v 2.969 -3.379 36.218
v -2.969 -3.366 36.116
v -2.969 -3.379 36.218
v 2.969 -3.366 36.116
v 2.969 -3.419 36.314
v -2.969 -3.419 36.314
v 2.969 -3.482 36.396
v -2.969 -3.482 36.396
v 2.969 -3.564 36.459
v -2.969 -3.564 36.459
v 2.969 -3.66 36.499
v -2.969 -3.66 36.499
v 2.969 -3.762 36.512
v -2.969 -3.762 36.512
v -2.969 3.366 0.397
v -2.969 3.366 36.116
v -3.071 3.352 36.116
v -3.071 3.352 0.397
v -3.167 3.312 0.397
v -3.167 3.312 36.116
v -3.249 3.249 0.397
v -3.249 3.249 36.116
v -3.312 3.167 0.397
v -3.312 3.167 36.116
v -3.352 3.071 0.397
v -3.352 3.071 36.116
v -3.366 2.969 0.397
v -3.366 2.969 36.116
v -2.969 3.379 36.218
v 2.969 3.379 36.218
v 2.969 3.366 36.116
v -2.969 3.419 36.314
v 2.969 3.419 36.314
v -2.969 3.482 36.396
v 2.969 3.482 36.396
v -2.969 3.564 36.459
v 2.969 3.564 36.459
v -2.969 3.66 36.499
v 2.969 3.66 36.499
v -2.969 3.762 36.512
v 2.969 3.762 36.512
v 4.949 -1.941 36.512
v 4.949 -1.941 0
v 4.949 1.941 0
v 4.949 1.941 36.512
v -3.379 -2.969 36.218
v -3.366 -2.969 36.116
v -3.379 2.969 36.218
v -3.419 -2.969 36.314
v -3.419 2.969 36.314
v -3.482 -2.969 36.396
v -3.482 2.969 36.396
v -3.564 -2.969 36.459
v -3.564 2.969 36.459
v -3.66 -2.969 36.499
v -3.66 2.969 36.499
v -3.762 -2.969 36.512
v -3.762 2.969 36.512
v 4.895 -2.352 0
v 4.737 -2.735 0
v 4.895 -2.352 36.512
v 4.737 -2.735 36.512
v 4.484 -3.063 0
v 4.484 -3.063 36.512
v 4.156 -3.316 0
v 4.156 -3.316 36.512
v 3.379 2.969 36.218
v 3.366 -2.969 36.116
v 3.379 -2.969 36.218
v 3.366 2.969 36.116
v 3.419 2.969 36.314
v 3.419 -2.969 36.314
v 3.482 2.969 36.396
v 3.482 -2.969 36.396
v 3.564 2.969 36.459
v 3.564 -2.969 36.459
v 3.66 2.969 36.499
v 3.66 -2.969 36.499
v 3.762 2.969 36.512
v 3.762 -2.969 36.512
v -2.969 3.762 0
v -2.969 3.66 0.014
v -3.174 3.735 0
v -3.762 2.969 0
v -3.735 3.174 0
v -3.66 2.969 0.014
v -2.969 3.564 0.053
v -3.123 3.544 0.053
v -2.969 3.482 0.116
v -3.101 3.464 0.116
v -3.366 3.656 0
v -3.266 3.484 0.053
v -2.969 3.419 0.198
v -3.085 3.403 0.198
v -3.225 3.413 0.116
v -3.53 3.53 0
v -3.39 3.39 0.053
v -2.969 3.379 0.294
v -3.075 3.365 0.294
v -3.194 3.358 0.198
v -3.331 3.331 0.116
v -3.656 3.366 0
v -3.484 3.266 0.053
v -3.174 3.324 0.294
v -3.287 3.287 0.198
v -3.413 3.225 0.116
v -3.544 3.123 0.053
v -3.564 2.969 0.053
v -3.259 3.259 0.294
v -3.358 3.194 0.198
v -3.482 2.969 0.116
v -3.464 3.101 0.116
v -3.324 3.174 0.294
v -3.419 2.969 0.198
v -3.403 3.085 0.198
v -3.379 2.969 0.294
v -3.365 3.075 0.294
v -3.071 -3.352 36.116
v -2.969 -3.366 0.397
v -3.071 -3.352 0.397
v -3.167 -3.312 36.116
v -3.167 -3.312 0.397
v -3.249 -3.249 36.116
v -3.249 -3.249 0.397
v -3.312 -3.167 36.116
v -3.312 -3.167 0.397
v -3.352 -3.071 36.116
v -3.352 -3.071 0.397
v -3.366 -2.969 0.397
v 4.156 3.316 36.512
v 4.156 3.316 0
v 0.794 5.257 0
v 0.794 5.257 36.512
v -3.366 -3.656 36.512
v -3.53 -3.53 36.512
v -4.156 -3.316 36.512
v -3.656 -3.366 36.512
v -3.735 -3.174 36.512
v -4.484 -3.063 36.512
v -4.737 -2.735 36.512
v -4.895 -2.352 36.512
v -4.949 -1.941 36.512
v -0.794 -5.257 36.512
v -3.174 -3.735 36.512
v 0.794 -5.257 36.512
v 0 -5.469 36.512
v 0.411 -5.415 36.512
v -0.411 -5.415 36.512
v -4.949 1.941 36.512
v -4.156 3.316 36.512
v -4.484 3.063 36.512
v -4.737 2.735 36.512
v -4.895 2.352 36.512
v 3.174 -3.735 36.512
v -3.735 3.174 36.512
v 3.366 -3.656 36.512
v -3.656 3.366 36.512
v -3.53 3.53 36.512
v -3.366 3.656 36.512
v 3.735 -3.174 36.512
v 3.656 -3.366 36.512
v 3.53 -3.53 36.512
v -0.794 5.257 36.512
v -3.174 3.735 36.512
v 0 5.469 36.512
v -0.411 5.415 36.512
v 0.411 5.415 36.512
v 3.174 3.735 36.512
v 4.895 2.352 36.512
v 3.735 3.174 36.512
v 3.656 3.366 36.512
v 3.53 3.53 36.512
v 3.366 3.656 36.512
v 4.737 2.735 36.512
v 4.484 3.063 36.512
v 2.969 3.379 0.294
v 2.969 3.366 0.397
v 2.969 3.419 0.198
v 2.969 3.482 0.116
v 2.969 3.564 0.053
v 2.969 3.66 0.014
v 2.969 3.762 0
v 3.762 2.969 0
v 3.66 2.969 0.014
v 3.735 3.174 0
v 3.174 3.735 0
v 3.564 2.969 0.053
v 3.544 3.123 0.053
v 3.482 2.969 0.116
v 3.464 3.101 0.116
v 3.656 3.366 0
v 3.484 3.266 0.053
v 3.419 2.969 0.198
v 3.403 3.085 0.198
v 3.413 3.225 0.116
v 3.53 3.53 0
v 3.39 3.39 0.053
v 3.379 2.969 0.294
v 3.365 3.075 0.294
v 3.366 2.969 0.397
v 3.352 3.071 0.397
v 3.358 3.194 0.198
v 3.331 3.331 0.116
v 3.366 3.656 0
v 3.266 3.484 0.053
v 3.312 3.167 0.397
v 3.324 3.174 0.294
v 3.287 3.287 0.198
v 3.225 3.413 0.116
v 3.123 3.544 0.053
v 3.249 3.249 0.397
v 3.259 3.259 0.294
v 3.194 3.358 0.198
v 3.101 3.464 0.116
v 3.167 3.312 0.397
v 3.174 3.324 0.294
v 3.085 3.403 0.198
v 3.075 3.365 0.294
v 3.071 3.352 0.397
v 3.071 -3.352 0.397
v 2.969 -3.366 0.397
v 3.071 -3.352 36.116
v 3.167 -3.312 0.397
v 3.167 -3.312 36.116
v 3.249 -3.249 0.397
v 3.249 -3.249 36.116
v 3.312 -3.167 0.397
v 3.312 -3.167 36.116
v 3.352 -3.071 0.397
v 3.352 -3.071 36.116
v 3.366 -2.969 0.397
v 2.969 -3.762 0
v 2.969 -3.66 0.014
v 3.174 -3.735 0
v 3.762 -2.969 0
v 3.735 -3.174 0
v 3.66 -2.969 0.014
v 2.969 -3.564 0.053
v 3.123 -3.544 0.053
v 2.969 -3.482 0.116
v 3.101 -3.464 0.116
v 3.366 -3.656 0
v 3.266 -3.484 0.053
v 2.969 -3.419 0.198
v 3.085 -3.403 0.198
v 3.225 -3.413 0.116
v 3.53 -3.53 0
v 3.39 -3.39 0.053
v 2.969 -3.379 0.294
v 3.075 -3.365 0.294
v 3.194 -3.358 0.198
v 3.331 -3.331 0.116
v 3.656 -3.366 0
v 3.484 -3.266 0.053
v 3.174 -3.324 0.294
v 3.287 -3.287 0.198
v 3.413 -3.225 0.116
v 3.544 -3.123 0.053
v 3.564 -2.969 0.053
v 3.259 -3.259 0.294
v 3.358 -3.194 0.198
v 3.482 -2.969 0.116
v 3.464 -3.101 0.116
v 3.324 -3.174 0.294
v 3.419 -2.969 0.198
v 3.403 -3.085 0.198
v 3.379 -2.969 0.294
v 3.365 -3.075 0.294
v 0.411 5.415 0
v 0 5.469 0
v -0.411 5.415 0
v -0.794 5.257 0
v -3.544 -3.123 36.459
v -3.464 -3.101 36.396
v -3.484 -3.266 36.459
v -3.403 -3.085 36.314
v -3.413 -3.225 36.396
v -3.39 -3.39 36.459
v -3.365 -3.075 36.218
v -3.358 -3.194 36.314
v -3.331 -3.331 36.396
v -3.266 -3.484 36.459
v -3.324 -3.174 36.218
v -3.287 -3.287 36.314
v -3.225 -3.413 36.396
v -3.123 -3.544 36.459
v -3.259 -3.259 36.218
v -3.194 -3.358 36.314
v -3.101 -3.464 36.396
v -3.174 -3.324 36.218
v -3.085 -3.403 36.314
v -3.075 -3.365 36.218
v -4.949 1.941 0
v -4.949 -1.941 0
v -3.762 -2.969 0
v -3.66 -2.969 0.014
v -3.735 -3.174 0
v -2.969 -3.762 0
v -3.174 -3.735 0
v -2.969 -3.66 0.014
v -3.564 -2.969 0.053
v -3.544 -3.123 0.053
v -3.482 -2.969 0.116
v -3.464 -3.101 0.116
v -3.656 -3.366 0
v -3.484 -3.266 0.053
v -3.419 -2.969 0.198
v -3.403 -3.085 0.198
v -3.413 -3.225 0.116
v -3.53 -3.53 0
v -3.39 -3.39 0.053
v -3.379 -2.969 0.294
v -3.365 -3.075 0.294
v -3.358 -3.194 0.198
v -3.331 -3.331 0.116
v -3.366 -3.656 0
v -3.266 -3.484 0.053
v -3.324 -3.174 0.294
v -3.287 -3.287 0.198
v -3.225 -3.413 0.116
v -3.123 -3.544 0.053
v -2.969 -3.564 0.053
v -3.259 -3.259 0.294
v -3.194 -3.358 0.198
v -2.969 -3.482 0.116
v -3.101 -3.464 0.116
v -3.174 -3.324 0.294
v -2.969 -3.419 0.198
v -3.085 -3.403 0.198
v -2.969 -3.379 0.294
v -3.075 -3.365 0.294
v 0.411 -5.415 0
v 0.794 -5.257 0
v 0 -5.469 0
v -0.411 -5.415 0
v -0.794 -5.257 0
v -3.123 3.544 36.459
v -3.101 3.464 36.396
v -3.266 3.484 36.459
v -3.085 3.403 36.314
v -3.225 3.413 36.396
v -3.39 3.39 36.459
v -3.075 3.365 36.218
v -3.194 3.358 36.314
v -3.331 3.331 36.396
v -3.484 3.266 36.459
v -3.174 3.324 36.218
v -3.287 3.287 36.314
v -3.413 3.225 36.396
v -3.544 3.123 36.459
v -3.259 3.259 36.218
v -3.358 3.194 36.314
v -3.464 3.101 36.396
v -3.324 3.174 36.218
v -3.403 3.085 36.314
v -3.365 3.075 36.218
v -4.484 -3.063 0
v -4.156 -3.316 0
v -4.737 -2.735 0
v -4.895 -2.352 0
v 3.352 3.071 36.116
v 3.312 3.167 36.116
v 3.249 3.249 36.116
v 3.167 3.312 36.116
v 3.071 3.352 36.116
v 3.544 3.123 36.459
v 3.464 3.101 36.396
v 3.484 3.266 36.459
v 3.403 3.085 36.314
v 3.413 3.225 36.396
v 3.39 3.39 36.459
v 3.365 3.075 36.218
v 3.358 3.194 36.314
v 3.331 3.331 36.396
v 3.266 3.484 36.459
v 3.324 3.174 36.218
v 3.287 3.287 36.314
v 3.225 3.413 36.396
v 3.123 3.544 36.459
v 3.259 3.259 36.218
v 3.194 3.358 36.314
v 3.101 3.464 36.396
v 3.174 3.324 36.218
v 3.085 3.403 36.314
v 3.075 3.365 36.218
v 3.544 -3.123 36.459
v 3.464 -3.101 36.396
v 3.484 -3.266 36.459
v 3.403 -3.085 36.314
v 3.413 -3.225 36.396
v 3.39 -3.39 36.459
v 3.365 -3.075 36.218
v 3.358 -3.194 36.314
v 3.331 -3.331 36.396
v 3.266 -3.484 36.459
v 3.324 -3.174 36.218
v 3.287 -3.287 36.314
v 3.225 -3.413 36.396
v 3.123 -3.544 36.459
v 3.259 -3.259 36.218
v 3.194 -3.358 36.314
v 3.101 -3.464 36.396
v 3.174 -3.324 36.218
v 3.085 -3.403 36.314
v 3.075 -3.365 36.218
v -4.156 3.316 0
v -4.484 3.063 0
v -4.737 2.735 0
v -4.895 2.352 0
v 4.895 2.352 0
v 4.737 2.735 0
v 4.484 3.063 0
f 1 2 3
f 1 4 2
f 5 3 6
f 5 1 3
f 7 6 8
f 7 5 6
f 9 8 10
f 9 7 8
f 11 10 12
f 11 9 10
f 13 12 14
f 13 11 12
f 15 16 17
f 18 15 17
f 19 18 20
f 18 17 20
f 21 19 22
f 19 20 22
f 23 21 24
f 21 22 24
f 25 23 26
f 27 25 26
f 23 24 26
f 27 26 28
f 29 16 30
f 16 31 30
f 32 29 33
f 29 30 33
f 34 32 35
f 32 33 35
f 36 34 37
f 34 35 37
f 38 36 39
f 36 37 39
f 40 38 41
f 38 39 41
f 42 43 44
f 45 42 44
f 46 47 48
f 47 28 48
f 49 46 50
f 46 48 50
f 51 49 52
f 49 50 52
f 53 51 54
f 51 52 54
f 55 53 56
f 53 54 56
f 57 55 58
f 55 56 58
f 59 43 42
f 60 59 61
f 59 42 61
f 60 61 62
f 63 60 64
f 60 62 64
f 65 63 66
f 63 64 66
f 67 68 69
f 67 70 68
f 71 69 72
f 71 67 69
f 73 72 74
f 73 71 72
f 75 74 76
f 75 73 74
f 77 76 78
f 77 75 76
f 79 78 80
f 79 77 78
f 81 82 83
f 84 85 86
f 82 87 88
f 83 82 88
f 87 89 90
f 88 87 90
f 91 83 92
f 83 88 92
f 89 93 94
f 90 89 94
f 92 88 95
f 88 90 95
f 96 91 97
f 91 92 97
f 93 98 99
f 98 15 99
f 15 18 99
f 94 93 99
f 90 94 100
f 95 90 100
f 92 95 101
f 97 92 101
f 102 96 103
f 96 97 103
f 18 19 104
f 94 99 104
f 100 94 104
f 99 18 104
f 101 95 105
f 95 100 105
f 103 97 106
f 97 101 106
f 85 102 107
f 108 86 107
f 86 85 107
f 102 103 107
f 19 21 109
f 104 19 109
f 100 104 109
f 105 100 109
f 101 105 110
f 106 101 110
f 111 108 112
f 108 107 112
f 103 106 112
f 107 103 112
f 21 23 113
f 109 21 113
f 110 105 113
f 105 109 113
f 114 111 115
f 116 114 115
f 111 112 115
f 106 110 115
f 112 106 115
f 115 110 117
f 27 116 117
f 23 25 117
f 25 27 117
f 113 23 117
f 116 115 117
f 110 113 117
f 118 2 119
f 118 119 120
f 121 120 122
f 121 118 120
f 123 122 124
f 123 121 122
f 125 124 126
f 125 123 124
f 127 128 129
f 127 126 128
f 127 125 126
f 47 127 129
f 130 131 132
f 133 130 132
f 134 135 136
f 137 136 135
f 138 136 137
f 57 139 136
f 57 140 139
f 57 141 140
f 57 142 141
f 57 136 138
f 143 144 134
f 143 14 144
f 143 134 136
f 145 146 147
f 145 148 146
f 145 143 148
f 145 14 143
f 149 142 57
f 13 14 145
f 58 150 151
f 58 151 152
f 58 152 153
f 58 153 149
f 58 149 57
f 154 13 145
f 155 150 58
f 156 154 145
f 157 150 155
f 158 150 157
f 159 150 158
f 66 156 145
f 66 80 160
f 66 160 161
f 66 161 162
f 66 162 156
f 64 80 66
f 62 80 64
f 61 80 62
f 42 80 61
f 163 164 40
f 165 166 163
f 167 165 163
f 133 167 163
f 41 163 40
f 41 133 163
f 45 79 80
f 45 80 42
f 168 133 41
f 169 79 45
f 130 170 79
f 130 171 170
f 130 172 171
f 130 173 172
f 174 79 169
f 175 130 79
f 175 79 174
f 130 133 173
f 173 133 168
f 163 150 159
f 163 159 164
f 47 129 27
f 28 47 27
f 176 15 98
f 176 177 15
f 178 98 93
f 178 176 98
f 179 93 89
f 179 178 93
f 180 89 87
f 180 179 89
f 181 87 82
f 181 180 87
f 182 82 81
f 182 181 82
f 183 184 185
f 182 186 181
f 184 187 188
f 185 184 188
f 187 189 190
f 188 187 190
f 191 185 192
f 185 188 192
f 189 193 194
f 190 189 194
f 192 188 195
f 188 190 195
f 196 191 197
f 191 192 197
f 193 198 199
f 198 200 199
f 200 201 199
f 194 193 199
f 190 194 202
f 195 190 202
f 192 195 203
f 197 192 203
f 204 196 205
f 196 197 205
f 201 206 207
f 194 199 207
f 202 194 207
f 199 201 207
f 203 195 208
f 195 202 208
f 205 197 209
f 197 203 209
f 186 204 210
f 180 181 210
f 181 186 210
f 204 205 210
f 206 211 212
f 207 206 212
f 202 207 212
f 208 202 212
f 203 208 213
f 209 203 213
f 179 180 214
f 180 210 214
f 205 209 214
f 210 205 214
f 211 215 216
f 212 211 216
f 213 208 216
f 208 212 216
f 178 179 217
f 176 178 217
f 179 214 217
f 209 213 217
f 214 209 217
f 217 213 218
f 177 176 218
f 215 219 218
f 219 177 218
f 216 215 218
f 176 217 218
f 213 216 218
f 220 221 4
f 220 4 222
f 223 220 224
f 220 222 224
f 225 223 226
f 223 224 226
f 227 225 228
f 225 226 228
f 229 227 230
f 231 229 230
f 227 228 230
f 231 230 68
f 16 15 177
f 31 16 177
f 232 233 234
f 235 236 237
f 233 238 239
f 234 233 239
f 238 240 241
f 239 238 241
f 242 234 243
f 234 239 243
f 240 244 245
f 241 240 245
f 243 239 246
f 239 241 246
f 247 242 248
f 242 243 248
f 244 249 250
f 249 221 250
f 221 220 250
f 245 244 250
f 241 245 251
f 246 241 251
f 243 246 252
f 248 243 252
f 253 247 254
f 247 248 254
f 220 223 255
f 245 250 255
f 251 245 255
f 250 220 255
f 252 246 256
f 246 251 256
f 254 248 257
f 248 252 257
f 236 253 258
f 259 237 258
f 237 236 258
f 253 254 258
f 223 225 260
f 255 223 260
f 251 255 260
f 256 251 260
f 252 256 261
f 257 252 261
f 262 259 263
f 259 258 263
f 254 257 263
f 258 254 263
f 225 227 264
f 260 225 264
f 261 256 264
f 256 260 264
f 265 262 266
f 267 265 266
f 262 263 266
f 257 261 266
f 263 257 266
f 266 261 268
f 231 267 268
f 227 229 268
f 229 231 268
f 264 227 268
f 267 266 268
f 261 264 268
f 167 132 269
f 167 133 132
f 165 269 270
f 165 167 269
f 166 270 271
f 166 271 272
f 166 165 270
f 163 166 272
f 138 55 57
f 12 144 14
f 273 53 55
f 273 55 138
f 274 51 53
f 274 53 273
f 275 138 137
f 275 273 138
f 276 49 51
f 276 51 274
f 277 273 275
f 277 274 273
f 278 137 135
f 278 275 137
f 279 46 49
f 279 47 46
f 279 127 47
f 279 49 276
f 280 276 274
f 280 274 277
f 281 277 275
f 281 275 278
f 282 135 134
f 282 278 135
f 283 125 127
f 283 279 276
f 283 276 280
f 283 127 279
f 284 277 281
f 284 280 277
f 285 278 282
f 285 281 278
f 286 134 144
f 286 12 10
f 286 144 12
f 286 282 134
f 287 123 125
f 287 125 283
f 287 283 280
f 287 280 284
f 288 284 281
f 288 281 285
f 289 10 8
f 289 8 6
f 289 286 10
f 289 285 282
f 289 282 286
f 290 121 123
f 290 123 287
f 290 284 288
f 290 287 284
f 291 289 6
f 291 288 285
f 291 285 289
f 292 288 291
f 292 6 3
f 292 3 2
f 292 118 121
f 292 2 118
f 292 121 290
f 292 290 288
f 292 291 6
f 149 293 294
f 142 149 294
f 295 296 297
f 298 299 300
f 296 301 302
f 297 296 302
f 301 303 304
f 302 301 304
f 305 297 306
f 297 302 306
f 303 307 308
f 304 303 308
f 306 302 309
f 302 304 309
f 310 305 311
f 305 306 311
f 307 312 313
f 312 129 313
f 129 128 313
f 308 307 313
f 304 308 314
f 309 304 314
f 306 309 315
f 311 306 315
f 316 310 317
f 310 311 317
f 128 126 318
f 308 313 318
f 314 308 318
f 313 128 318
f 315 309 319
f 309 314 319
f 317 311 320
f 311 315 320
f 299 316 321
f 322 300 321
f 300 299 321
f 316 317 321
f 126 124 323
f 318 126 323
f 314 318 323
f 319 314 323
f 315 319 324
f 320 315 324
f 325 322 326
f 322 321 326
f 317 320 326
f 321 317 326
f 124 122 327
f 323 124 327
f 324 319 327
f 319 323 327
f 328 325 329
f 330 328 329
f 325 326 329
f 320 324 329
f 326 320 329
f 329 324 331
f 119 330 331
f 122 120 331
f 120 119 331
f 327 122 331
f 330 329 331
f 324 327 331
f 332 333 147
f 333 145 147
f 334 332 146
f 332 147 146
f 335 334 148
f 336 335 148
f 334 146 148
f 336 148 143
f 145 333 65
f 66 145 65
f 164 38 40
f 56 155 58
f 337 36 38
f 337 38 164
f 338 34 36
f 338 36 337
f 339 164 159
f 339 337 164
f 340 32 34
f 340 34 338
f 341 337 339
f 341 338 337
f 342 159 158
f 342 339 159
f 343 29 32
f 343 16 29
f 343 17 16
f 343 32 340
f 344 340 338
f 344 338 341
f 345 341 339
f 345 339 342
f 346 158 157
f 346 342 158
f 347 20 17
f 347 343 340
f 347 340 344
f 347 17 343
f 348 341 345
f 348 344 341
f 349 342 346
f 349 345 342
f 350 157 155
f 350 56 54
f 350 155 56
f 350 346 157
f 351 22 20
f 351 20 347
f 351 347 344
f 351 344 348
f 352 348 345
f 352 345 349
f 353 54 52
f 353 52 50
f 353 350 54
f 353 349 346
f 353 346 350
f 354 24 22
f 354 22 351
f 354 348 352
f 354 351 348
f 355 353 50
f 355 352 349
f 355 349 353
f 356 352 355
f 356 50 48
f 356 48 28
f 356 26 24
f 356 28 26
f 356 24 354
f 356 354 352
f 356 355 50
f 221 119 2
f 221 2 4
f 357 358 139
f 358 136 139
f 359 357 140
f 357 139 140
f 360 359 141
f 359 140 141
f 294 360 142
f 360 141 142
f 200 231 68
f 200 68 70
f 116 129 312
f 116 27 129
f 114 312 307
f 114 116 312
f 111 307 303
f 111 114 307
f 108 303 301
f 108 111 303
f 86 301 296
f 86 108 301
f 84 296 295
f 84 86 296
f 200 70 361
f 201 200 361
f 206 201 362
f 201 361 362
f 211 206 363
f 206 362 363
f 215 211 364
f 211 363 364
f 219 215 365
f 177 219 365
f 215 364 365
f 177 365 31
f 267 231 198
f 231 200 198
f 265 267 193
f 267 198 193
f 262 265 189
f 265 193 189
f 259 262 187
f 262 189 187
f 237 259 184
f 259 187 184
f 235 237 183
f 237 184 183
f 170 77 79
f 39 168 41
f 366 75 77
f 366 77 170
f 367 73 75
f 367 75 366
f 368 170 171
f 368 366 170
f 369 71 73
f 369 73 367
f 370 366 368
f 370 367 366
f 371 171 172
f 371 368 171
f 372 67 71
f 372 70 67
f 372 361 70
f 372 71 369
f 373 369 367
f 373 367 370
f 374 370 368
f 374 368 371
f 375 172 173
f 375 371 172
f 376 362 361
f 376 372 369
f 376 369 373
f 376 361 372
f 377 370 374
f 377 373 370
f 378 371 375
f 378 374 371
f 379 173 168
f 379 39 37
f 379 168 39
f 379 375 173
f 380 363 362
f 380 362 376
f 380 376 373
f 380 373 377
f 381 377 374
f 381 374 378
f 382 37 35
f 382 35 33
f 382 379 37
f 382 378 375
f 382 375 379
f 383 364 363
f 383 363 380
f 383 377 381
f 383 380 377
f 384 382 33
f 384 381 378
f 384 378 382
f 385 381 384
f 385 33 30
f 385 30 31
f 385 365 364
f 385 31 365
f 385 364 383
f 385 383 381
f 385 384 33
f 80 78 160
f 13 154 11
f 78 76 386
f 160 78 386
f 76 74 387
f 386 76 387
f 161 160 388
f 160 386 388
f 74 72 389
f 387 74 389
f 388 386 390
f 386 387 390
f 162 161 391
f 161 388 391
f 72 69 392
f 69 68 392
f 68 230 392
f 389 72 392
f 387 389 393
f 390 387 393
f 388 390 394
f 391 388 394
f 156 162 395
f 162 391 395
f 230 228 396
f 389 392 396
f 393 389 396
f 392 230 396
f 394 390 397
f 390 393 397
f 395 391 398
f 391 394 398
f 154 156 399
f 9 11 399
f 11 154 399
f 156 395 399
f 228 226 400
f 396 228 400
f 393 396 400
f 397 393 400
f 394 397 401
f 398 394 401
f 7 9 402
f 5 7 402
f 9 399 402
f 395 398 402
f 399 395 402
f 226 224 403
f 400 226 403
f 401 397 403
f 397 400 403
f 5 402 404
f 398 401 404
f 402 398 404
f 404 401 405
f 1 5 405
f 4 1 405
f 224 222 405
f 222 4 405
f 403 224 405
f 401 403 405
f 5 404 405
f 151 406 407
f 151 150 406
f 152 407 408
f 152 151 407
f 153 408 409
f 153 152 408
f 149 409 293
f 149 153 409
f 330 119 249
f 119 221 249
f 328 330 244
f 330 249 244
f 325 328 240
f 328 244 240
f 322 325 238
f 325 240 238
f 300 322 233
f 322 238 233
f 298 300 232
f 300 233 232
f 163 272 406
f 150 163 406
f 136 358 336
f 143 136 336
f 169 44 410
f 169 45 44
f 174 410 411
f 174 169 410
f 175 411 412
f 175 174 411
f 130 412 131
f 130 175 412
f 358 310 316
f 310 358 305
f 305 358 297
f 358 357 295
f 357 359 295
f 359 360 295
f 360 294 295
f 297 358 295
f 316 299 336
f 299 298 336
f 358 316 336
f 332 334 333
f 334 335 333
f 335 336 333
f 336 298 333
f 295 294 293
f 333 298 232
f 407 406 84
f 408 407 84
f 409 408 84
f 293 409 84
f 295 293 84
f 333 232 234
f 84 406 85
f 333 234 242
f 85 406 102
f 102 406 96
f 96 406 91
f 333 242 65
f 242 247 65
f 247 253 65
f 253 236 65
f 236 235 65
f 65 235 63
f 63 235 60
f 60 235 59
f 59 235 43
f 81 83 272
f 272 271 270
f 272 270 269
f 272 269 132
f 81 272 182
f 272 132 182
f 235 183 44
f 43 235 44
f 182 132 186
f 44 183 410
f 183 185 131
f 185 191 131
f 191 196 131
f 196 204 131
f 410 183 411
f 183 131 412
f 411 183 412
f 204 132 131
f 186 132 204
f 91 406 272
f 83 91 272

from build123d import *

# Parameters (mm, degrees)
SKETCH1_W           = 6.731
SKETCH1_H           = 6.731
BOSS_EXTRUDE1_DEPTH = 36.5125
FILLET1_R           = 0.396875
FILLET2_R           = 1.5875


with BuildPart() as part:
    # Sketch1 → Boss-Extrude1 (new body)
    with BuildSketch(Plane.XY):
        Polygon((4.949335183, -2.8575), (4.949335183, 2.8575), (0, 5.715), (-4.949335183, 2.8575), (-4.949335183, -2.8575), (0, -5.715), align=None)
        Rectangle(SKETCH1_W, SKETCH1_H, mode=Mode.SUBTRACT)
    extrude(amount=BOSS_EXTRUDE1_DEPTH)

    # Fillet1
    fillet1_edges = [part.edges().sort_by_distance(p)[0] for p in [
        (3.3655, 0, 0),
        (3.3655, -3.3655, 18.25625),
        (0, 3.3655, 0),
        (3.3655, 3.3655, 18.25625),
        (-3.3655, 0, 0),
        (-3.3655, 3.3655, 18.25625),
        (0, -3.3655, 0),
        (-3.3655, -3.3655, 18.25625),
        (3.3655, 0, 36.5125),
        (0, 3.3655, 36.5125),
        (-3.3655, 0, 36.5125),
        (0, -3.3655, 36.5125),
    ]]
    fillet(fillet1_edges, radius=FILLET1_R)

    # Fillet2
    fillet2_edges = [part.edges().sort_by_distance(p)[0] for p in [
        (0, -5.715, 18.25625),
        (-4.949335183, -2.8575, 18.25625),
        (-4.949335183, 2.8575, 18.25625),
        (0, 5.715, 18.25625),
        (4.949335183, 2.8575, 18.25625),
        (4.949335183, -2.8575, 18.25625),
    ]]
    fillet(fillet2_edges, radius=FILLET2_R)


solid = part.part
